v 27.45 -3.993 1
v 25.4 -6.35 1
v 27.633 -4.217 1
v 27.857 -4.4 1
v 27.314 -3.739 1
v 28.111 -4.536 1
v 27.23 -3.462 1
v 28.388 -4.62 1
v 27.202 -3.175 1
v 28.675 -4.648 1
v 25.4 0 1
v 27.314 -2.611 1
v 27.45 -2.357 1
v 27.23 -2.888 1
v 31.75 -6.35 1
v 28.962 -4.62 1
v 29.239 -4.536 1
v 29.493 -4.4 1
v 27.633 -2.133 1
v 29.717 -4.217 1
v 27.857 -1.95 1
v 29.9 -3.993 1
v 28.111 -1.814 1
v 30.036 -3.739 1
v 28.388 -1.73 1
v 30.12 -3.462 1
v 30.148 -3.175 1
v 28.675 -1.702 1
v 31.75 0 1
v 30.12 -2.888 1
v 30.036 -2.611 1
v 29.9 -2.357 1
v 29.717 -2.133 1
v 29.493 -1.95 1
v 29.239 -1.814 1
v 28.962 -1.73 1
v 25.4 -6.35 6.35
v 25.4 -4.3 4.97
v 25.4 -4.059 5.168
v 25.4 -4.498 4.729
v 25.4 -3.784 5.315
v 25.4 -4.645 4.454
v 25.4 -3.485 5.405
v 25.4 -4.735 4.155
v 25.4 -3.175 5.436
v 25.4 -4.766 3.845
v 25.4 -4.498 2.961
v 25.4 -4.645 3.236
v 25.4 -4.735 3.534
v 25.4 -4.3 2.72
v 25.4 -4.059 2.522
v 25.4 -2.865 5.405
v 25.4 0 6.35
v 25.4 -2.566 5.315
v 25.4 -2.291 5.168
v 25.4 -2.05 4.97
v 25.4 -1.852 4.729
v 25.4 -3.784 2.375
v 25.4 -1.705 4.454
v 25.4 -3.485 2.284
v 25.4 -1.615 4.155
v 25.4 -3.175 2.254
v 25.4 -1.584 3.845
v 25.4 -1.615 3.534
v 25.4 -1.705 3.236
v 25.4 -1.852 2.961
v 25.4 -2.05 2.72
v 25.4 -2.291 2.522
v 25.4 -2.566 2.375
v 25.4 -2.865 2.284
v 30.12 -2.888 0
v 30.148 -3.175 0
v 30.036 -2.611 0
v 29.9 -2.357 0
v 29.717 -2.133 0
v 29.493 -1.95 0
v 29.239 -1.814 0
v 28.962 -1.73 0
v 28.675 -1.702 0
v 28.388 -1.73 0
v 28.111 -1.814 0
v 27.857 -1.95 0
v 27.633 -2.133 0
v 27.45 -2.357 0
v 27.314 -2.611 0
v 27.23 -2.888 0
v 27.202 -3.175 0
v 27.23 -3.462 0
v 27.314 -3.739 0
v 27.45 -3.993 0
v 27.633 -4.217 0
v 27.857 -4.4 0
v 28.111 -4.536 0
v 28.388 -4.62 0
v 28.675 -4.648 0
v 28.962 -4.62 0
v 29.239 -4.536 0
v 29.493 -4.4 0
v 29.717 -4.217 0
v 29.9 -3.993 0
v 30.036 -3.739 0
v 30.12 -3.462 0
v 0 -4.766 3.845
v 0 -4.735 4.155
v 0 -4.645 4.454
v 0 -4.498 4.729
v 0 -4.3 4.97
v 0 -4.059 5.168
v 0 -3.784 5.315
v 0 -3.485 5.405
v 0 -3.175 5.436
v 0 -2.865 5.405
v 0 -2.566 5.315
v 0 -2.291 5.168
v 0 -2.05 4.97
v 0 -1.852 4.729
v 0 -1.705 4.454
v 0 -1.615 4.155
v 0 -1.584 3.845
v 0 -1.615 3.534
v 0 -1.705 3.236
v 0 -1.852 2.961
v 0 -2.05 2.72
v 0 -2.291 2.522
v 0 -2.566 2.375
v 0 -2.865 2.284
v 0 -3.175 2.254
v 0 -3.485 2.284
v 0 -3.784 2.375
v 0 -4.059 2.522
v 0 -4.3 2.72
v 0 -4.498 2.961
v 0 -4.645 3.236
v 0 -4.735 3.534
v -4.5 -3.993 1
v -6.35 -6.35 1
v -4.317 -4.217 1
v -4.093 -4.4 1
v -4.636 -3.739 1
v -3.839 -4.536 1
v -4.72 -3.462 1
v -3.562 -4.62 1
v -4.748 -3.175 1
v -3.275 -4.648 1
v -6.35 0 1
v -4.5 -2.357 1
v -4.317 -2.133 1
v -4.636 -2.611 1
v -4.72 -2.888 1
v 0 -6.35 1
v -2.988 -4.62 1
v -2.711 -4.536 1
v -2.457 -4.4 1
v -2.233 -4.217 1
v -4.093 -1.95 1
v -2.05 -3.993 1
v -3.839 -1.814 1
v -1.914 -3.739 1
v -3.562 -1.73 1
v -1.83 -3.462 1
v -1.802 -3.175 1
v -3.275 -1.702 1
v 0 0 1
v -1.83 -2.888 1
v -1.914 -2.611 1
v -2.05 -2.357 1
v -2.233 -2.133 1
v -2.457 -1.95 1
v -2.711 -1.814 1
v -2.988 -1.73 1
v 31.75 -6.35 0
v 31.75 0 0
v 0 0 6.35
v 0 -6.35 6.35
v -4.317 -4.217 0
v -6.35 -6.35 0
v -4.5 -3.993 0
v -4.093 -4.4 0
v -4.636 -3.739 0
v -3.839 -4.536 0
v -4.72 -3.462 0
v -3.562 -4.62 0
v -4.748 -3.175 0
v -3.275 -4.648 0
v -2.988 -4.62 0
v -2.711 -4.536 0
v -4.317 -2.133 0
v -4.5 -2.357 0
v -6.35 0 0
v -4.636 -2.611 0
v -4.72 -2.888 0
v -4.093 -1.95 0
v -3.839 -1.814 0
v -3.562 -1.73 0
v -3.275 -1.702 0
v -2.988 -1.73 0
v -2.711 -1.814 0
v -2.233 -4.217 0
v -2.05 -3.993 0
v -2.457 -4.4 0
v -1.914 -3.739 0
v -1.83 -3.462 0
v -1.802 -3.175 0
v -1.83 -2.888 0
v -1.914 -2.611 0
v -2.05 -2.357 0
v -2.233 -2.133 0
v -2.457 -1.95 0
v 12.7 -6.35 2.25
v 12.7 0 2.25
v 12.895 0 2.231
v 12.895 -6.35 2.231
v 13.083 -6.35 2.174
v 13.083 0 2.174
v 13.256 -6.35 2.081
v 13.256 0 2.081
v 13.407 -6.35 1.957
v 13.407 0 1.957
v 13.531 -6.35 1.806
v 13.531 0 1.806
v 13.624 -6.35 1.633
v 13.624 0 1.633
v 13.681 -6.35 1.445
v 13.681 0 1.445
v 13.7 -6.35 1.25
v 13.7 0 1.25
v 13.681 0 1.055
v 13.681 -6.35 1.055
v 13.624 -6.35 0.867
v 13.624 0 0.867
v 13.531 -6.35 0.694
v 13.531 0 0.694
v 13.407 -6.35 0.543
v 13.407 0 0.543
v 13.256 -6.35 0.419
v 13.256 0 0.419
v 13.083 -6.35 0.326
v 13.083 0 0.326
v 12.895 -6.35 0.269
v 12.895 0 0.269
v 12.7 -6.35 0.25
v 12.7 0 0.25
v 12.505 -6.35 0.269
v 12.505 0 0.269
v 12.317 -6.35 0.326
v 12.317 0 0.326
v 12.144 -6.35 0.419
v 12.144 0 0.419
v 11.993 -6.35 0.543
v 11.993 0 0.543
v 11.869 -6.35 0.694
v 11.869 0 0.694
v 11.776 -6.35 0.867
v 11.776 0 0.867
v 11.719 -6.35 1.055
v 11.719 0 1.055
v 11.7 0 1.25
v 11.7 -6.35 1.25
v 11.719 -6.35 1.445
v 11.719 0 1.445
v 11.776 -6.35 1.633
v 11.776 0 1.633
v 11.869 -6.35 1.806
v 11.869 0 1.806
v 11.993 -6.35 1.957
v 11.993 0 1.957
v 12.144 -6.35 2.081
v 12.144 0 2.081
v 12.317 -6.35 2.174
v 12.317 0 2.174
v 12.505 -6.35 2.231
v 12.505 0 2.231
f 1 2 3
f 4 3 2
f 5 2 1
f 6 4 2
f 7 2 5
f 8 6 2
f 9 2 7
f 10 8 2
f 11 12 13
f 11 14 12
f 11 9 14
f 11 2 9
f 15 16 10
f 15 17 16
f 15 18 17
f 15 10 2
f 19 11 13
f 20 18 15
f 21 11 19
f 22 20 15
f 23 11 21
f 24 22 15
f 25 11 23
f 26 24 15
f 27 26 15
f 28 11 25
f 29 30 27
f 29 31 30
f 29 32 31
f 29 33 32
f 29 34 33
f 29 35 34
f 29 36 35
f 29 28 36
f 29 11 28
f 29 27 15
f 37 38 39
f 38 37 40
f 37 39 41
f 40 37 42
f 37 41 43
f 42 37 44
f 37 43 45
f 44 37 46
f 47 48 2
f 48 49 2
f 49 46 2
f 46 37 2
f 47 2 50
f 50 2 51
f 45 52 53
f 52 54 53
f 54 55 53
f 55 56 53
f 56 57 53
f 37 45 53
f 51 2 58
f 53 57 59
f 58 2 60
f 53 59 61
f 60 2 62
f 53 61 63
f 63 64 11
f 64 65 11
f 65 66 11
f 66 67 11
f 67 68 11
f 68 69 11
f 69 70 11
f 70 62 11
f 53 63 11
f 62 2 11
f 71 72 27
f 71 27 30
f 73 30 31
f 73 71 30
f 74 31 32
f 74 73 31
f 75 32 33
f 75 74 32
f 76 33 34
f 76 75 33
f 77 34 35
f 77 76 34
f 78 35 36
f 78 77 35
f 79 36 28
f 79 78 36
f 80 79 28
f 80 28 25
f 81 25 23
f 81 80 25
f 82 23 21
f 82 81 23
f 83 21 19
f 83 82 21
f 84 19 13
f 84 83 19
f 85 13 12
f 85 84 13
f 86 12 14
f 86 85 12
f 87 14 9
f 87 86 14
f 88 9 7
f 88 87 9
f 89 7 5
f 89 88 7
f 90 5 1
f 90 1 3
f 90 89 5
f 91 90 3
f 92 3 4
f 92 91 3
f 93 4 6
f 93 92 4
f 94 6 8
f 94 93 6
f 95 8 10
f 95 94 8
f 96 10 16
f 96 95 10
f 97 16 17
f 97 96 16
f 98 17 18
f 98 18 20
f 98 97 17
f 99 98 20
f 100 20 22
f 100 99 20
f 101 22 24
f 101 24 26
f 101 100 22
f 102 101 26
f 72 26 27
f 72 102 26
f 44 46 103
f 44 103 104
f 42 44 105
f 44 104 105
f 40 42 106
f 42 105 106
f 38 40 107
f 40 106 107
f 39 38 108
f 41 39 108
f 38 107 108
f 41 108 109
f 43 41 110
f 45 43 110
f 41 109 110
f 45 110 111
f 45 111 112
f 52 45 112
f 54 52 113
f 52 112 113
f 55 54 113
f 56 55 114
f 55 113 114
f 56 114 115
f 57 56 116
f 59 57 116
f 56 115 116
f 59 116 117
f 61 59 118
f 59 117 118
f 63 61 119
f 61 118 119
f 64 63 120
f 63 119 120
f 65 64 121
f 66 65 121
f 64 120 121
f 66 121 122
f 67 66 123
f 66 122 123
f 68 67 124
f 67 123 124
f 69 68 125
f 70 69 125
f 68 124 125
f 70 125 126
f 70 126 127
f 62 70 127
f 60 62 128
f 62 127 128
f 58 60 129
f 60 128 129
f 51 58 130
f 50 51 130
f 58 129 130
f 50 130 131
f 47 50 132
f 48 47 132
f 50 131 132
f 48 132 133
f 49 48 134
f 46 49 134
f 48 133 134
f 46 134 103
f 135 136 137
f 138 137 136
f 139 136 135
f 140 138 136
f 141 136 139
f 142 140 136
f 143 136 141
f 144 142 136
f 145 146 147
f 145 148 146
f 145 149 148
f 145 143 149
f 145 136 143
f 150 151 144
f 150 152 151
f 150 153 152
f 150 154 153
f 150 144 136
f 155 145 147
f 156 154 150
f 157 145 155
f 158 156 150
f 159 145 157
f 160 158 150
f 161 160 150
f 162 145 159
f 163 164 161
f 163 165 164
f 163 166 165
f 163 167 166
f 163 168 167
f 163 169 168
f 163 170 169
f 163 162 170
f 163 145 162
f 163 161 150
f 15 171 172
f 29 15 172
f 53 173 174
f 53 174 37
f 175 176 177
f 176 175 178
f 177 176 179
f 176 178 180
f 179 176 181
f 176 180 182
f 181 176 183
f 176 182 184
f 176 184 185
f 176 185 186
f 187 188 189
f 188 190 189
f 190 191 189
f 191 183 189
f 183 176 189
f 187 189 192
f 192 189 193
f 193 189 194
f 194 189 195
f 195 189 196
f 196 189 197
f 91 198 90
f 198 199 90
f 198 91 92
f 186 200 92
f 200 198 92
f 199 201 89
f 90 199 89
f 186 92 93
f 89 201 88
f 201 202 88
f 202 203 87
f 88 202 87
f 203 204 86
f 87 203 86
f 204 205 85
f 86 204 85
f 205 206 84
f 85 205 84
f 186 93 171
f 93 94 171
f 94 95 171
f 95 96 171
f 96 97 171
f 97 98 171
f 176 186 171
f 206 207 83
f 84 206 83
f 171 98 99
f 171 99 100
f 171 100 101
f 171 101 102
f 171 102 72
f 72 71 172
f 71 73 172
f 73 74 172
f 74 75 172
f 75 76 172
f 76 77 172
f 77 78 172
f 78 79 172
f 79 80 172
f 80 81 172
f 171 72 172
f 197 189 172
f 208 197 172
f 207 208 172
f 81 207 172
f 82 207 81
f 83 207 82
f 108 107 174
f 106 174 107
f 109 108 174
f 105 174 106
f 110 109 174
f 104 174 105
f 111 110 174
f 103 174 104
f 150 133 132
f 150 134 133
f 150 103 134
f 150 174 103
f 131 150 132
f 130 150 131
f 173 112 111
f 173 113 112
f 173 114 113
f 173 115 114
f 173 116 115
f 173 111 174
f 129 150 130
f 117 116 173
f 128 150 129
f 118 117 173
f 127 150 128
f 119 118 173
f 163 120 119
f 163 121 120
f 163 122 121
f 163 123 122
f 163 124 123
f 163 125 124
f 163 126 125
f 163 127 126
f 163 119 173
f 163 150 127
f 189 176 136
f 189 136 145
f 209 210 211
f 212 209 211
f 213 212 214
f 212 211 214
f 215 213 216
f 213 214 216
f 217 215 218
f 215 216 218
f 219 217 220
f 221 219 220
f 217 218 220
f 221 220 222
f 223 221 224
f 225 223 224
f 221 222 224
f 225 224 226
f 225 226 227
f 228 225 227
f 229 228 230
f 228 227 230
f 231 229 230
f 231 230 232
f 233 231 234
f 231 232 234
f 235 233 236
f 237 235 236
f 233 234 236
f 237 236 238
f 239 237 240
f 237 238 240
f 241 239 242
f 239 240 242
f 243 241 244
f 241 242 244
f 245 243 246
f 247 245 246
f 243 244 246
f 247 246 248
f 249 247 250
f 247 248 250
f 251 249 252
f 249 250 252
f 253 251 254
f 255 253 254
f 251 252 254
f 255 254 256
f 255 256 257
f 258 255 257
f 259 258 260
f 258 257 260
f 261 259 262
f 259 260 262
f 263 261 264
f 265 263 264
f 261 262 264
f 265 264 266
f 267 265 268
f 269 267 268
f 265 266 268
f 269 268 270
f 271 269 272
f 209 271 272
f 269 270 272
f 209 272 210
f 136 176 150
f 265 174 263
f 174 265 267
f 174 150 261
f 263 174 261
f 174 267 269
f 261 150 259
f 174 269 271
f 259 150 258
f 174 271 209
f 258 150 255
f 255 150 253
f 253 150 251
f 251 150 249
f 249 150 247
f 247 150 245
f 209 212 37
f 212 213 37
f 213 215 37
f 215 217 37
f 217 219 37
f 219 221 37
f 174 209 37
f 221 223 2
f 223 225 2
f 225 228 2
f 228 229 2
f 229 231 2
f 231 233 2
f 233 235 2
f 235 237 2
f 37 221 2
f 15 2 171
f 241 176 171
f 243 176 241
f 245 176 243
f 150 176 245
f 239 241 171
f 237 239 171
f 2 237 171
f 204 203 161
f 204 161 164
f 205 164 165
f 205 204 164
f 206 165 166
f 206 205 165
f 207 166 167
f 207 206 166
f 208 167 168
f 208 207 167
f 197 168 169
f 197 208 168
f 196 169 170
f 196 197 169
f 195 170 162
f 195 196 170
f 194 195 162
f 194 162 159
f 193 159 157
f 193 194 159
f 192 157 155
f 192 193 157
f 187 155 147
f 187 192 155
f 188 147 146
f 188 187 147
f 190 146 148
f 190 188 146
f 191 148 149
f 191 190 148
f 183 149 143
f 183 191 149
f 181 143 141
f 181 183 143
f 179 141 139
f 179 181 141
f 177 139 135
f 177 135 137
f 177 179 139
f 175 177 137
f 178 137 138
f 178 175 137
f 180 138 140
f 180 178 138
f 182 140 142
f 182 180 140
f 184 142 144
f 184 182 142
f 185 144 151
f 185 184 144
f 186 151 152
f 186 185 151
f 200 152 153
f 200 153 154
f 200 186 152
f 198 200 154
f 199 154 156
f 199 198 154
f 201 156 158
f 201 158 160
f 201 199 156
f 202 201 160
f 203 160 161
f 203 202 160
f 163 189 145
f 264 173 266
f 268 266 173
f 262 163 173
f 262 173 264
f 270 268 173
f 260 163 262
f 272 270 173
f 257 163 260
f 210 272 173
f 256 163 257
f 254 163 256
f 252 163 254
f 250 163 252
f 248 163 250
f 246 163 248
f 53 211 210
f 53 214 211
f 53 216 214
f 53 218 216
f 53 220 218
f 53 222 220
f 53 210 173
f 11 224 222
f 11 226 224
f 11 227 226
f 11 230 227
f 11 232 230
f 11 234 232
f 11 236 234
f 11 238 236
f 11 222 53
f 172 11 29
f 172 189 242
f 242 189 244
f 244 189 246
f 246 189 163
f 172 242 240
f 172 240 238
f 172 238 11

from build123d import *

# Parameters (mm, degrees)
SKETCH1_W             = 6.35
SKETCH1_H             = 6.35
SKETCH1_R             = 1.4732
BOSS_EXTRUDE1_DEPTH   = 1
BOSS_EXTRUDE1_2_DEPTH = 1
SKETCH1_3_W           = 25.4
SKETCH1_3_H           = 6.35
BOSS_EXTRUDE2_DEPTH   = 6.35
SKETCH2_R             = 1.591
CUT_EXTRUDE1_DEPTH    = 25.4
SKETCH3_R             = 1
CUT_EXTRUDE2_DEPTH    = 6.35


with BuildPart() as part:
    # Sketch1 → Boss-Extrude1 (new body)
    with BuildSketch(Plane.XY):
        with Locations((-3.175, -3.175)):
            Rectangle(SKETCH1_W, SKETCH1_H)
        with Locations((-3.275, -3.175)):
            Circle(SKETCH1_R, mode=Mode.SUBTRACT)
    extrude(amount=BOSS_EXTRUDE1_DEPTH)



with BuildPart() as body_2:
    # Sketch1 → Boss-Extrude1 2 (new body)
    with BuildSketch(Plane.XY):
        with Locations((28.575, -3.175)):
            Rectangle(SKETCH1_W, SKETCH1_H)
        with Locations((28.675, -3.175)):
            Circle(SKETCH1_R, mode=Mode.SUBTRACT)
    extrude(amount=BOSS_EXTRUDE1_2_DEPTH)


with BuildPart() as part_1:
    add(part.part)

    add(body_2.part)  # Boss-Extrude2 merges body 2
    # Sketch1<3> → Boss-Extrude2 (add)
    with BuildSketch(Plane.XY):
        with Locations((12.7, -3.175)):
            Rectangle(SKETCH1_3_W, SKETCH1_3_H)
    extrude(amount=BOSS_EXTRUDE2_DEPTH)

    # Sketch2 → Cut-Extrude1 (cut)
    with BuildSketch(Plane.ZY):
        with Locations(Location((3.8448, -3.175, 0), (0, 0, 270))):
            Circle(SKETCH2_R)
    extrude(amount=-CUT_EXTRUDE1_DEPTH, mode=Mode.SUBTRACT)

    # Sketch3 → Cut-Extrude2 (cut)
    with BuildSketch(Plane(origin=(0, 0, 0), x_dir=(1, 0, 0), z_dir=(0, 1, 0))):
        with Locations(Location((12.7, -1.25, 0), (0, 0, 270))):
            Circle(SKETCH3_R)
    extrude(amount=-CUT_EXTRUDE2_DEPTH, mode=Mode.SUBTRACT)


solid = part_1.part
